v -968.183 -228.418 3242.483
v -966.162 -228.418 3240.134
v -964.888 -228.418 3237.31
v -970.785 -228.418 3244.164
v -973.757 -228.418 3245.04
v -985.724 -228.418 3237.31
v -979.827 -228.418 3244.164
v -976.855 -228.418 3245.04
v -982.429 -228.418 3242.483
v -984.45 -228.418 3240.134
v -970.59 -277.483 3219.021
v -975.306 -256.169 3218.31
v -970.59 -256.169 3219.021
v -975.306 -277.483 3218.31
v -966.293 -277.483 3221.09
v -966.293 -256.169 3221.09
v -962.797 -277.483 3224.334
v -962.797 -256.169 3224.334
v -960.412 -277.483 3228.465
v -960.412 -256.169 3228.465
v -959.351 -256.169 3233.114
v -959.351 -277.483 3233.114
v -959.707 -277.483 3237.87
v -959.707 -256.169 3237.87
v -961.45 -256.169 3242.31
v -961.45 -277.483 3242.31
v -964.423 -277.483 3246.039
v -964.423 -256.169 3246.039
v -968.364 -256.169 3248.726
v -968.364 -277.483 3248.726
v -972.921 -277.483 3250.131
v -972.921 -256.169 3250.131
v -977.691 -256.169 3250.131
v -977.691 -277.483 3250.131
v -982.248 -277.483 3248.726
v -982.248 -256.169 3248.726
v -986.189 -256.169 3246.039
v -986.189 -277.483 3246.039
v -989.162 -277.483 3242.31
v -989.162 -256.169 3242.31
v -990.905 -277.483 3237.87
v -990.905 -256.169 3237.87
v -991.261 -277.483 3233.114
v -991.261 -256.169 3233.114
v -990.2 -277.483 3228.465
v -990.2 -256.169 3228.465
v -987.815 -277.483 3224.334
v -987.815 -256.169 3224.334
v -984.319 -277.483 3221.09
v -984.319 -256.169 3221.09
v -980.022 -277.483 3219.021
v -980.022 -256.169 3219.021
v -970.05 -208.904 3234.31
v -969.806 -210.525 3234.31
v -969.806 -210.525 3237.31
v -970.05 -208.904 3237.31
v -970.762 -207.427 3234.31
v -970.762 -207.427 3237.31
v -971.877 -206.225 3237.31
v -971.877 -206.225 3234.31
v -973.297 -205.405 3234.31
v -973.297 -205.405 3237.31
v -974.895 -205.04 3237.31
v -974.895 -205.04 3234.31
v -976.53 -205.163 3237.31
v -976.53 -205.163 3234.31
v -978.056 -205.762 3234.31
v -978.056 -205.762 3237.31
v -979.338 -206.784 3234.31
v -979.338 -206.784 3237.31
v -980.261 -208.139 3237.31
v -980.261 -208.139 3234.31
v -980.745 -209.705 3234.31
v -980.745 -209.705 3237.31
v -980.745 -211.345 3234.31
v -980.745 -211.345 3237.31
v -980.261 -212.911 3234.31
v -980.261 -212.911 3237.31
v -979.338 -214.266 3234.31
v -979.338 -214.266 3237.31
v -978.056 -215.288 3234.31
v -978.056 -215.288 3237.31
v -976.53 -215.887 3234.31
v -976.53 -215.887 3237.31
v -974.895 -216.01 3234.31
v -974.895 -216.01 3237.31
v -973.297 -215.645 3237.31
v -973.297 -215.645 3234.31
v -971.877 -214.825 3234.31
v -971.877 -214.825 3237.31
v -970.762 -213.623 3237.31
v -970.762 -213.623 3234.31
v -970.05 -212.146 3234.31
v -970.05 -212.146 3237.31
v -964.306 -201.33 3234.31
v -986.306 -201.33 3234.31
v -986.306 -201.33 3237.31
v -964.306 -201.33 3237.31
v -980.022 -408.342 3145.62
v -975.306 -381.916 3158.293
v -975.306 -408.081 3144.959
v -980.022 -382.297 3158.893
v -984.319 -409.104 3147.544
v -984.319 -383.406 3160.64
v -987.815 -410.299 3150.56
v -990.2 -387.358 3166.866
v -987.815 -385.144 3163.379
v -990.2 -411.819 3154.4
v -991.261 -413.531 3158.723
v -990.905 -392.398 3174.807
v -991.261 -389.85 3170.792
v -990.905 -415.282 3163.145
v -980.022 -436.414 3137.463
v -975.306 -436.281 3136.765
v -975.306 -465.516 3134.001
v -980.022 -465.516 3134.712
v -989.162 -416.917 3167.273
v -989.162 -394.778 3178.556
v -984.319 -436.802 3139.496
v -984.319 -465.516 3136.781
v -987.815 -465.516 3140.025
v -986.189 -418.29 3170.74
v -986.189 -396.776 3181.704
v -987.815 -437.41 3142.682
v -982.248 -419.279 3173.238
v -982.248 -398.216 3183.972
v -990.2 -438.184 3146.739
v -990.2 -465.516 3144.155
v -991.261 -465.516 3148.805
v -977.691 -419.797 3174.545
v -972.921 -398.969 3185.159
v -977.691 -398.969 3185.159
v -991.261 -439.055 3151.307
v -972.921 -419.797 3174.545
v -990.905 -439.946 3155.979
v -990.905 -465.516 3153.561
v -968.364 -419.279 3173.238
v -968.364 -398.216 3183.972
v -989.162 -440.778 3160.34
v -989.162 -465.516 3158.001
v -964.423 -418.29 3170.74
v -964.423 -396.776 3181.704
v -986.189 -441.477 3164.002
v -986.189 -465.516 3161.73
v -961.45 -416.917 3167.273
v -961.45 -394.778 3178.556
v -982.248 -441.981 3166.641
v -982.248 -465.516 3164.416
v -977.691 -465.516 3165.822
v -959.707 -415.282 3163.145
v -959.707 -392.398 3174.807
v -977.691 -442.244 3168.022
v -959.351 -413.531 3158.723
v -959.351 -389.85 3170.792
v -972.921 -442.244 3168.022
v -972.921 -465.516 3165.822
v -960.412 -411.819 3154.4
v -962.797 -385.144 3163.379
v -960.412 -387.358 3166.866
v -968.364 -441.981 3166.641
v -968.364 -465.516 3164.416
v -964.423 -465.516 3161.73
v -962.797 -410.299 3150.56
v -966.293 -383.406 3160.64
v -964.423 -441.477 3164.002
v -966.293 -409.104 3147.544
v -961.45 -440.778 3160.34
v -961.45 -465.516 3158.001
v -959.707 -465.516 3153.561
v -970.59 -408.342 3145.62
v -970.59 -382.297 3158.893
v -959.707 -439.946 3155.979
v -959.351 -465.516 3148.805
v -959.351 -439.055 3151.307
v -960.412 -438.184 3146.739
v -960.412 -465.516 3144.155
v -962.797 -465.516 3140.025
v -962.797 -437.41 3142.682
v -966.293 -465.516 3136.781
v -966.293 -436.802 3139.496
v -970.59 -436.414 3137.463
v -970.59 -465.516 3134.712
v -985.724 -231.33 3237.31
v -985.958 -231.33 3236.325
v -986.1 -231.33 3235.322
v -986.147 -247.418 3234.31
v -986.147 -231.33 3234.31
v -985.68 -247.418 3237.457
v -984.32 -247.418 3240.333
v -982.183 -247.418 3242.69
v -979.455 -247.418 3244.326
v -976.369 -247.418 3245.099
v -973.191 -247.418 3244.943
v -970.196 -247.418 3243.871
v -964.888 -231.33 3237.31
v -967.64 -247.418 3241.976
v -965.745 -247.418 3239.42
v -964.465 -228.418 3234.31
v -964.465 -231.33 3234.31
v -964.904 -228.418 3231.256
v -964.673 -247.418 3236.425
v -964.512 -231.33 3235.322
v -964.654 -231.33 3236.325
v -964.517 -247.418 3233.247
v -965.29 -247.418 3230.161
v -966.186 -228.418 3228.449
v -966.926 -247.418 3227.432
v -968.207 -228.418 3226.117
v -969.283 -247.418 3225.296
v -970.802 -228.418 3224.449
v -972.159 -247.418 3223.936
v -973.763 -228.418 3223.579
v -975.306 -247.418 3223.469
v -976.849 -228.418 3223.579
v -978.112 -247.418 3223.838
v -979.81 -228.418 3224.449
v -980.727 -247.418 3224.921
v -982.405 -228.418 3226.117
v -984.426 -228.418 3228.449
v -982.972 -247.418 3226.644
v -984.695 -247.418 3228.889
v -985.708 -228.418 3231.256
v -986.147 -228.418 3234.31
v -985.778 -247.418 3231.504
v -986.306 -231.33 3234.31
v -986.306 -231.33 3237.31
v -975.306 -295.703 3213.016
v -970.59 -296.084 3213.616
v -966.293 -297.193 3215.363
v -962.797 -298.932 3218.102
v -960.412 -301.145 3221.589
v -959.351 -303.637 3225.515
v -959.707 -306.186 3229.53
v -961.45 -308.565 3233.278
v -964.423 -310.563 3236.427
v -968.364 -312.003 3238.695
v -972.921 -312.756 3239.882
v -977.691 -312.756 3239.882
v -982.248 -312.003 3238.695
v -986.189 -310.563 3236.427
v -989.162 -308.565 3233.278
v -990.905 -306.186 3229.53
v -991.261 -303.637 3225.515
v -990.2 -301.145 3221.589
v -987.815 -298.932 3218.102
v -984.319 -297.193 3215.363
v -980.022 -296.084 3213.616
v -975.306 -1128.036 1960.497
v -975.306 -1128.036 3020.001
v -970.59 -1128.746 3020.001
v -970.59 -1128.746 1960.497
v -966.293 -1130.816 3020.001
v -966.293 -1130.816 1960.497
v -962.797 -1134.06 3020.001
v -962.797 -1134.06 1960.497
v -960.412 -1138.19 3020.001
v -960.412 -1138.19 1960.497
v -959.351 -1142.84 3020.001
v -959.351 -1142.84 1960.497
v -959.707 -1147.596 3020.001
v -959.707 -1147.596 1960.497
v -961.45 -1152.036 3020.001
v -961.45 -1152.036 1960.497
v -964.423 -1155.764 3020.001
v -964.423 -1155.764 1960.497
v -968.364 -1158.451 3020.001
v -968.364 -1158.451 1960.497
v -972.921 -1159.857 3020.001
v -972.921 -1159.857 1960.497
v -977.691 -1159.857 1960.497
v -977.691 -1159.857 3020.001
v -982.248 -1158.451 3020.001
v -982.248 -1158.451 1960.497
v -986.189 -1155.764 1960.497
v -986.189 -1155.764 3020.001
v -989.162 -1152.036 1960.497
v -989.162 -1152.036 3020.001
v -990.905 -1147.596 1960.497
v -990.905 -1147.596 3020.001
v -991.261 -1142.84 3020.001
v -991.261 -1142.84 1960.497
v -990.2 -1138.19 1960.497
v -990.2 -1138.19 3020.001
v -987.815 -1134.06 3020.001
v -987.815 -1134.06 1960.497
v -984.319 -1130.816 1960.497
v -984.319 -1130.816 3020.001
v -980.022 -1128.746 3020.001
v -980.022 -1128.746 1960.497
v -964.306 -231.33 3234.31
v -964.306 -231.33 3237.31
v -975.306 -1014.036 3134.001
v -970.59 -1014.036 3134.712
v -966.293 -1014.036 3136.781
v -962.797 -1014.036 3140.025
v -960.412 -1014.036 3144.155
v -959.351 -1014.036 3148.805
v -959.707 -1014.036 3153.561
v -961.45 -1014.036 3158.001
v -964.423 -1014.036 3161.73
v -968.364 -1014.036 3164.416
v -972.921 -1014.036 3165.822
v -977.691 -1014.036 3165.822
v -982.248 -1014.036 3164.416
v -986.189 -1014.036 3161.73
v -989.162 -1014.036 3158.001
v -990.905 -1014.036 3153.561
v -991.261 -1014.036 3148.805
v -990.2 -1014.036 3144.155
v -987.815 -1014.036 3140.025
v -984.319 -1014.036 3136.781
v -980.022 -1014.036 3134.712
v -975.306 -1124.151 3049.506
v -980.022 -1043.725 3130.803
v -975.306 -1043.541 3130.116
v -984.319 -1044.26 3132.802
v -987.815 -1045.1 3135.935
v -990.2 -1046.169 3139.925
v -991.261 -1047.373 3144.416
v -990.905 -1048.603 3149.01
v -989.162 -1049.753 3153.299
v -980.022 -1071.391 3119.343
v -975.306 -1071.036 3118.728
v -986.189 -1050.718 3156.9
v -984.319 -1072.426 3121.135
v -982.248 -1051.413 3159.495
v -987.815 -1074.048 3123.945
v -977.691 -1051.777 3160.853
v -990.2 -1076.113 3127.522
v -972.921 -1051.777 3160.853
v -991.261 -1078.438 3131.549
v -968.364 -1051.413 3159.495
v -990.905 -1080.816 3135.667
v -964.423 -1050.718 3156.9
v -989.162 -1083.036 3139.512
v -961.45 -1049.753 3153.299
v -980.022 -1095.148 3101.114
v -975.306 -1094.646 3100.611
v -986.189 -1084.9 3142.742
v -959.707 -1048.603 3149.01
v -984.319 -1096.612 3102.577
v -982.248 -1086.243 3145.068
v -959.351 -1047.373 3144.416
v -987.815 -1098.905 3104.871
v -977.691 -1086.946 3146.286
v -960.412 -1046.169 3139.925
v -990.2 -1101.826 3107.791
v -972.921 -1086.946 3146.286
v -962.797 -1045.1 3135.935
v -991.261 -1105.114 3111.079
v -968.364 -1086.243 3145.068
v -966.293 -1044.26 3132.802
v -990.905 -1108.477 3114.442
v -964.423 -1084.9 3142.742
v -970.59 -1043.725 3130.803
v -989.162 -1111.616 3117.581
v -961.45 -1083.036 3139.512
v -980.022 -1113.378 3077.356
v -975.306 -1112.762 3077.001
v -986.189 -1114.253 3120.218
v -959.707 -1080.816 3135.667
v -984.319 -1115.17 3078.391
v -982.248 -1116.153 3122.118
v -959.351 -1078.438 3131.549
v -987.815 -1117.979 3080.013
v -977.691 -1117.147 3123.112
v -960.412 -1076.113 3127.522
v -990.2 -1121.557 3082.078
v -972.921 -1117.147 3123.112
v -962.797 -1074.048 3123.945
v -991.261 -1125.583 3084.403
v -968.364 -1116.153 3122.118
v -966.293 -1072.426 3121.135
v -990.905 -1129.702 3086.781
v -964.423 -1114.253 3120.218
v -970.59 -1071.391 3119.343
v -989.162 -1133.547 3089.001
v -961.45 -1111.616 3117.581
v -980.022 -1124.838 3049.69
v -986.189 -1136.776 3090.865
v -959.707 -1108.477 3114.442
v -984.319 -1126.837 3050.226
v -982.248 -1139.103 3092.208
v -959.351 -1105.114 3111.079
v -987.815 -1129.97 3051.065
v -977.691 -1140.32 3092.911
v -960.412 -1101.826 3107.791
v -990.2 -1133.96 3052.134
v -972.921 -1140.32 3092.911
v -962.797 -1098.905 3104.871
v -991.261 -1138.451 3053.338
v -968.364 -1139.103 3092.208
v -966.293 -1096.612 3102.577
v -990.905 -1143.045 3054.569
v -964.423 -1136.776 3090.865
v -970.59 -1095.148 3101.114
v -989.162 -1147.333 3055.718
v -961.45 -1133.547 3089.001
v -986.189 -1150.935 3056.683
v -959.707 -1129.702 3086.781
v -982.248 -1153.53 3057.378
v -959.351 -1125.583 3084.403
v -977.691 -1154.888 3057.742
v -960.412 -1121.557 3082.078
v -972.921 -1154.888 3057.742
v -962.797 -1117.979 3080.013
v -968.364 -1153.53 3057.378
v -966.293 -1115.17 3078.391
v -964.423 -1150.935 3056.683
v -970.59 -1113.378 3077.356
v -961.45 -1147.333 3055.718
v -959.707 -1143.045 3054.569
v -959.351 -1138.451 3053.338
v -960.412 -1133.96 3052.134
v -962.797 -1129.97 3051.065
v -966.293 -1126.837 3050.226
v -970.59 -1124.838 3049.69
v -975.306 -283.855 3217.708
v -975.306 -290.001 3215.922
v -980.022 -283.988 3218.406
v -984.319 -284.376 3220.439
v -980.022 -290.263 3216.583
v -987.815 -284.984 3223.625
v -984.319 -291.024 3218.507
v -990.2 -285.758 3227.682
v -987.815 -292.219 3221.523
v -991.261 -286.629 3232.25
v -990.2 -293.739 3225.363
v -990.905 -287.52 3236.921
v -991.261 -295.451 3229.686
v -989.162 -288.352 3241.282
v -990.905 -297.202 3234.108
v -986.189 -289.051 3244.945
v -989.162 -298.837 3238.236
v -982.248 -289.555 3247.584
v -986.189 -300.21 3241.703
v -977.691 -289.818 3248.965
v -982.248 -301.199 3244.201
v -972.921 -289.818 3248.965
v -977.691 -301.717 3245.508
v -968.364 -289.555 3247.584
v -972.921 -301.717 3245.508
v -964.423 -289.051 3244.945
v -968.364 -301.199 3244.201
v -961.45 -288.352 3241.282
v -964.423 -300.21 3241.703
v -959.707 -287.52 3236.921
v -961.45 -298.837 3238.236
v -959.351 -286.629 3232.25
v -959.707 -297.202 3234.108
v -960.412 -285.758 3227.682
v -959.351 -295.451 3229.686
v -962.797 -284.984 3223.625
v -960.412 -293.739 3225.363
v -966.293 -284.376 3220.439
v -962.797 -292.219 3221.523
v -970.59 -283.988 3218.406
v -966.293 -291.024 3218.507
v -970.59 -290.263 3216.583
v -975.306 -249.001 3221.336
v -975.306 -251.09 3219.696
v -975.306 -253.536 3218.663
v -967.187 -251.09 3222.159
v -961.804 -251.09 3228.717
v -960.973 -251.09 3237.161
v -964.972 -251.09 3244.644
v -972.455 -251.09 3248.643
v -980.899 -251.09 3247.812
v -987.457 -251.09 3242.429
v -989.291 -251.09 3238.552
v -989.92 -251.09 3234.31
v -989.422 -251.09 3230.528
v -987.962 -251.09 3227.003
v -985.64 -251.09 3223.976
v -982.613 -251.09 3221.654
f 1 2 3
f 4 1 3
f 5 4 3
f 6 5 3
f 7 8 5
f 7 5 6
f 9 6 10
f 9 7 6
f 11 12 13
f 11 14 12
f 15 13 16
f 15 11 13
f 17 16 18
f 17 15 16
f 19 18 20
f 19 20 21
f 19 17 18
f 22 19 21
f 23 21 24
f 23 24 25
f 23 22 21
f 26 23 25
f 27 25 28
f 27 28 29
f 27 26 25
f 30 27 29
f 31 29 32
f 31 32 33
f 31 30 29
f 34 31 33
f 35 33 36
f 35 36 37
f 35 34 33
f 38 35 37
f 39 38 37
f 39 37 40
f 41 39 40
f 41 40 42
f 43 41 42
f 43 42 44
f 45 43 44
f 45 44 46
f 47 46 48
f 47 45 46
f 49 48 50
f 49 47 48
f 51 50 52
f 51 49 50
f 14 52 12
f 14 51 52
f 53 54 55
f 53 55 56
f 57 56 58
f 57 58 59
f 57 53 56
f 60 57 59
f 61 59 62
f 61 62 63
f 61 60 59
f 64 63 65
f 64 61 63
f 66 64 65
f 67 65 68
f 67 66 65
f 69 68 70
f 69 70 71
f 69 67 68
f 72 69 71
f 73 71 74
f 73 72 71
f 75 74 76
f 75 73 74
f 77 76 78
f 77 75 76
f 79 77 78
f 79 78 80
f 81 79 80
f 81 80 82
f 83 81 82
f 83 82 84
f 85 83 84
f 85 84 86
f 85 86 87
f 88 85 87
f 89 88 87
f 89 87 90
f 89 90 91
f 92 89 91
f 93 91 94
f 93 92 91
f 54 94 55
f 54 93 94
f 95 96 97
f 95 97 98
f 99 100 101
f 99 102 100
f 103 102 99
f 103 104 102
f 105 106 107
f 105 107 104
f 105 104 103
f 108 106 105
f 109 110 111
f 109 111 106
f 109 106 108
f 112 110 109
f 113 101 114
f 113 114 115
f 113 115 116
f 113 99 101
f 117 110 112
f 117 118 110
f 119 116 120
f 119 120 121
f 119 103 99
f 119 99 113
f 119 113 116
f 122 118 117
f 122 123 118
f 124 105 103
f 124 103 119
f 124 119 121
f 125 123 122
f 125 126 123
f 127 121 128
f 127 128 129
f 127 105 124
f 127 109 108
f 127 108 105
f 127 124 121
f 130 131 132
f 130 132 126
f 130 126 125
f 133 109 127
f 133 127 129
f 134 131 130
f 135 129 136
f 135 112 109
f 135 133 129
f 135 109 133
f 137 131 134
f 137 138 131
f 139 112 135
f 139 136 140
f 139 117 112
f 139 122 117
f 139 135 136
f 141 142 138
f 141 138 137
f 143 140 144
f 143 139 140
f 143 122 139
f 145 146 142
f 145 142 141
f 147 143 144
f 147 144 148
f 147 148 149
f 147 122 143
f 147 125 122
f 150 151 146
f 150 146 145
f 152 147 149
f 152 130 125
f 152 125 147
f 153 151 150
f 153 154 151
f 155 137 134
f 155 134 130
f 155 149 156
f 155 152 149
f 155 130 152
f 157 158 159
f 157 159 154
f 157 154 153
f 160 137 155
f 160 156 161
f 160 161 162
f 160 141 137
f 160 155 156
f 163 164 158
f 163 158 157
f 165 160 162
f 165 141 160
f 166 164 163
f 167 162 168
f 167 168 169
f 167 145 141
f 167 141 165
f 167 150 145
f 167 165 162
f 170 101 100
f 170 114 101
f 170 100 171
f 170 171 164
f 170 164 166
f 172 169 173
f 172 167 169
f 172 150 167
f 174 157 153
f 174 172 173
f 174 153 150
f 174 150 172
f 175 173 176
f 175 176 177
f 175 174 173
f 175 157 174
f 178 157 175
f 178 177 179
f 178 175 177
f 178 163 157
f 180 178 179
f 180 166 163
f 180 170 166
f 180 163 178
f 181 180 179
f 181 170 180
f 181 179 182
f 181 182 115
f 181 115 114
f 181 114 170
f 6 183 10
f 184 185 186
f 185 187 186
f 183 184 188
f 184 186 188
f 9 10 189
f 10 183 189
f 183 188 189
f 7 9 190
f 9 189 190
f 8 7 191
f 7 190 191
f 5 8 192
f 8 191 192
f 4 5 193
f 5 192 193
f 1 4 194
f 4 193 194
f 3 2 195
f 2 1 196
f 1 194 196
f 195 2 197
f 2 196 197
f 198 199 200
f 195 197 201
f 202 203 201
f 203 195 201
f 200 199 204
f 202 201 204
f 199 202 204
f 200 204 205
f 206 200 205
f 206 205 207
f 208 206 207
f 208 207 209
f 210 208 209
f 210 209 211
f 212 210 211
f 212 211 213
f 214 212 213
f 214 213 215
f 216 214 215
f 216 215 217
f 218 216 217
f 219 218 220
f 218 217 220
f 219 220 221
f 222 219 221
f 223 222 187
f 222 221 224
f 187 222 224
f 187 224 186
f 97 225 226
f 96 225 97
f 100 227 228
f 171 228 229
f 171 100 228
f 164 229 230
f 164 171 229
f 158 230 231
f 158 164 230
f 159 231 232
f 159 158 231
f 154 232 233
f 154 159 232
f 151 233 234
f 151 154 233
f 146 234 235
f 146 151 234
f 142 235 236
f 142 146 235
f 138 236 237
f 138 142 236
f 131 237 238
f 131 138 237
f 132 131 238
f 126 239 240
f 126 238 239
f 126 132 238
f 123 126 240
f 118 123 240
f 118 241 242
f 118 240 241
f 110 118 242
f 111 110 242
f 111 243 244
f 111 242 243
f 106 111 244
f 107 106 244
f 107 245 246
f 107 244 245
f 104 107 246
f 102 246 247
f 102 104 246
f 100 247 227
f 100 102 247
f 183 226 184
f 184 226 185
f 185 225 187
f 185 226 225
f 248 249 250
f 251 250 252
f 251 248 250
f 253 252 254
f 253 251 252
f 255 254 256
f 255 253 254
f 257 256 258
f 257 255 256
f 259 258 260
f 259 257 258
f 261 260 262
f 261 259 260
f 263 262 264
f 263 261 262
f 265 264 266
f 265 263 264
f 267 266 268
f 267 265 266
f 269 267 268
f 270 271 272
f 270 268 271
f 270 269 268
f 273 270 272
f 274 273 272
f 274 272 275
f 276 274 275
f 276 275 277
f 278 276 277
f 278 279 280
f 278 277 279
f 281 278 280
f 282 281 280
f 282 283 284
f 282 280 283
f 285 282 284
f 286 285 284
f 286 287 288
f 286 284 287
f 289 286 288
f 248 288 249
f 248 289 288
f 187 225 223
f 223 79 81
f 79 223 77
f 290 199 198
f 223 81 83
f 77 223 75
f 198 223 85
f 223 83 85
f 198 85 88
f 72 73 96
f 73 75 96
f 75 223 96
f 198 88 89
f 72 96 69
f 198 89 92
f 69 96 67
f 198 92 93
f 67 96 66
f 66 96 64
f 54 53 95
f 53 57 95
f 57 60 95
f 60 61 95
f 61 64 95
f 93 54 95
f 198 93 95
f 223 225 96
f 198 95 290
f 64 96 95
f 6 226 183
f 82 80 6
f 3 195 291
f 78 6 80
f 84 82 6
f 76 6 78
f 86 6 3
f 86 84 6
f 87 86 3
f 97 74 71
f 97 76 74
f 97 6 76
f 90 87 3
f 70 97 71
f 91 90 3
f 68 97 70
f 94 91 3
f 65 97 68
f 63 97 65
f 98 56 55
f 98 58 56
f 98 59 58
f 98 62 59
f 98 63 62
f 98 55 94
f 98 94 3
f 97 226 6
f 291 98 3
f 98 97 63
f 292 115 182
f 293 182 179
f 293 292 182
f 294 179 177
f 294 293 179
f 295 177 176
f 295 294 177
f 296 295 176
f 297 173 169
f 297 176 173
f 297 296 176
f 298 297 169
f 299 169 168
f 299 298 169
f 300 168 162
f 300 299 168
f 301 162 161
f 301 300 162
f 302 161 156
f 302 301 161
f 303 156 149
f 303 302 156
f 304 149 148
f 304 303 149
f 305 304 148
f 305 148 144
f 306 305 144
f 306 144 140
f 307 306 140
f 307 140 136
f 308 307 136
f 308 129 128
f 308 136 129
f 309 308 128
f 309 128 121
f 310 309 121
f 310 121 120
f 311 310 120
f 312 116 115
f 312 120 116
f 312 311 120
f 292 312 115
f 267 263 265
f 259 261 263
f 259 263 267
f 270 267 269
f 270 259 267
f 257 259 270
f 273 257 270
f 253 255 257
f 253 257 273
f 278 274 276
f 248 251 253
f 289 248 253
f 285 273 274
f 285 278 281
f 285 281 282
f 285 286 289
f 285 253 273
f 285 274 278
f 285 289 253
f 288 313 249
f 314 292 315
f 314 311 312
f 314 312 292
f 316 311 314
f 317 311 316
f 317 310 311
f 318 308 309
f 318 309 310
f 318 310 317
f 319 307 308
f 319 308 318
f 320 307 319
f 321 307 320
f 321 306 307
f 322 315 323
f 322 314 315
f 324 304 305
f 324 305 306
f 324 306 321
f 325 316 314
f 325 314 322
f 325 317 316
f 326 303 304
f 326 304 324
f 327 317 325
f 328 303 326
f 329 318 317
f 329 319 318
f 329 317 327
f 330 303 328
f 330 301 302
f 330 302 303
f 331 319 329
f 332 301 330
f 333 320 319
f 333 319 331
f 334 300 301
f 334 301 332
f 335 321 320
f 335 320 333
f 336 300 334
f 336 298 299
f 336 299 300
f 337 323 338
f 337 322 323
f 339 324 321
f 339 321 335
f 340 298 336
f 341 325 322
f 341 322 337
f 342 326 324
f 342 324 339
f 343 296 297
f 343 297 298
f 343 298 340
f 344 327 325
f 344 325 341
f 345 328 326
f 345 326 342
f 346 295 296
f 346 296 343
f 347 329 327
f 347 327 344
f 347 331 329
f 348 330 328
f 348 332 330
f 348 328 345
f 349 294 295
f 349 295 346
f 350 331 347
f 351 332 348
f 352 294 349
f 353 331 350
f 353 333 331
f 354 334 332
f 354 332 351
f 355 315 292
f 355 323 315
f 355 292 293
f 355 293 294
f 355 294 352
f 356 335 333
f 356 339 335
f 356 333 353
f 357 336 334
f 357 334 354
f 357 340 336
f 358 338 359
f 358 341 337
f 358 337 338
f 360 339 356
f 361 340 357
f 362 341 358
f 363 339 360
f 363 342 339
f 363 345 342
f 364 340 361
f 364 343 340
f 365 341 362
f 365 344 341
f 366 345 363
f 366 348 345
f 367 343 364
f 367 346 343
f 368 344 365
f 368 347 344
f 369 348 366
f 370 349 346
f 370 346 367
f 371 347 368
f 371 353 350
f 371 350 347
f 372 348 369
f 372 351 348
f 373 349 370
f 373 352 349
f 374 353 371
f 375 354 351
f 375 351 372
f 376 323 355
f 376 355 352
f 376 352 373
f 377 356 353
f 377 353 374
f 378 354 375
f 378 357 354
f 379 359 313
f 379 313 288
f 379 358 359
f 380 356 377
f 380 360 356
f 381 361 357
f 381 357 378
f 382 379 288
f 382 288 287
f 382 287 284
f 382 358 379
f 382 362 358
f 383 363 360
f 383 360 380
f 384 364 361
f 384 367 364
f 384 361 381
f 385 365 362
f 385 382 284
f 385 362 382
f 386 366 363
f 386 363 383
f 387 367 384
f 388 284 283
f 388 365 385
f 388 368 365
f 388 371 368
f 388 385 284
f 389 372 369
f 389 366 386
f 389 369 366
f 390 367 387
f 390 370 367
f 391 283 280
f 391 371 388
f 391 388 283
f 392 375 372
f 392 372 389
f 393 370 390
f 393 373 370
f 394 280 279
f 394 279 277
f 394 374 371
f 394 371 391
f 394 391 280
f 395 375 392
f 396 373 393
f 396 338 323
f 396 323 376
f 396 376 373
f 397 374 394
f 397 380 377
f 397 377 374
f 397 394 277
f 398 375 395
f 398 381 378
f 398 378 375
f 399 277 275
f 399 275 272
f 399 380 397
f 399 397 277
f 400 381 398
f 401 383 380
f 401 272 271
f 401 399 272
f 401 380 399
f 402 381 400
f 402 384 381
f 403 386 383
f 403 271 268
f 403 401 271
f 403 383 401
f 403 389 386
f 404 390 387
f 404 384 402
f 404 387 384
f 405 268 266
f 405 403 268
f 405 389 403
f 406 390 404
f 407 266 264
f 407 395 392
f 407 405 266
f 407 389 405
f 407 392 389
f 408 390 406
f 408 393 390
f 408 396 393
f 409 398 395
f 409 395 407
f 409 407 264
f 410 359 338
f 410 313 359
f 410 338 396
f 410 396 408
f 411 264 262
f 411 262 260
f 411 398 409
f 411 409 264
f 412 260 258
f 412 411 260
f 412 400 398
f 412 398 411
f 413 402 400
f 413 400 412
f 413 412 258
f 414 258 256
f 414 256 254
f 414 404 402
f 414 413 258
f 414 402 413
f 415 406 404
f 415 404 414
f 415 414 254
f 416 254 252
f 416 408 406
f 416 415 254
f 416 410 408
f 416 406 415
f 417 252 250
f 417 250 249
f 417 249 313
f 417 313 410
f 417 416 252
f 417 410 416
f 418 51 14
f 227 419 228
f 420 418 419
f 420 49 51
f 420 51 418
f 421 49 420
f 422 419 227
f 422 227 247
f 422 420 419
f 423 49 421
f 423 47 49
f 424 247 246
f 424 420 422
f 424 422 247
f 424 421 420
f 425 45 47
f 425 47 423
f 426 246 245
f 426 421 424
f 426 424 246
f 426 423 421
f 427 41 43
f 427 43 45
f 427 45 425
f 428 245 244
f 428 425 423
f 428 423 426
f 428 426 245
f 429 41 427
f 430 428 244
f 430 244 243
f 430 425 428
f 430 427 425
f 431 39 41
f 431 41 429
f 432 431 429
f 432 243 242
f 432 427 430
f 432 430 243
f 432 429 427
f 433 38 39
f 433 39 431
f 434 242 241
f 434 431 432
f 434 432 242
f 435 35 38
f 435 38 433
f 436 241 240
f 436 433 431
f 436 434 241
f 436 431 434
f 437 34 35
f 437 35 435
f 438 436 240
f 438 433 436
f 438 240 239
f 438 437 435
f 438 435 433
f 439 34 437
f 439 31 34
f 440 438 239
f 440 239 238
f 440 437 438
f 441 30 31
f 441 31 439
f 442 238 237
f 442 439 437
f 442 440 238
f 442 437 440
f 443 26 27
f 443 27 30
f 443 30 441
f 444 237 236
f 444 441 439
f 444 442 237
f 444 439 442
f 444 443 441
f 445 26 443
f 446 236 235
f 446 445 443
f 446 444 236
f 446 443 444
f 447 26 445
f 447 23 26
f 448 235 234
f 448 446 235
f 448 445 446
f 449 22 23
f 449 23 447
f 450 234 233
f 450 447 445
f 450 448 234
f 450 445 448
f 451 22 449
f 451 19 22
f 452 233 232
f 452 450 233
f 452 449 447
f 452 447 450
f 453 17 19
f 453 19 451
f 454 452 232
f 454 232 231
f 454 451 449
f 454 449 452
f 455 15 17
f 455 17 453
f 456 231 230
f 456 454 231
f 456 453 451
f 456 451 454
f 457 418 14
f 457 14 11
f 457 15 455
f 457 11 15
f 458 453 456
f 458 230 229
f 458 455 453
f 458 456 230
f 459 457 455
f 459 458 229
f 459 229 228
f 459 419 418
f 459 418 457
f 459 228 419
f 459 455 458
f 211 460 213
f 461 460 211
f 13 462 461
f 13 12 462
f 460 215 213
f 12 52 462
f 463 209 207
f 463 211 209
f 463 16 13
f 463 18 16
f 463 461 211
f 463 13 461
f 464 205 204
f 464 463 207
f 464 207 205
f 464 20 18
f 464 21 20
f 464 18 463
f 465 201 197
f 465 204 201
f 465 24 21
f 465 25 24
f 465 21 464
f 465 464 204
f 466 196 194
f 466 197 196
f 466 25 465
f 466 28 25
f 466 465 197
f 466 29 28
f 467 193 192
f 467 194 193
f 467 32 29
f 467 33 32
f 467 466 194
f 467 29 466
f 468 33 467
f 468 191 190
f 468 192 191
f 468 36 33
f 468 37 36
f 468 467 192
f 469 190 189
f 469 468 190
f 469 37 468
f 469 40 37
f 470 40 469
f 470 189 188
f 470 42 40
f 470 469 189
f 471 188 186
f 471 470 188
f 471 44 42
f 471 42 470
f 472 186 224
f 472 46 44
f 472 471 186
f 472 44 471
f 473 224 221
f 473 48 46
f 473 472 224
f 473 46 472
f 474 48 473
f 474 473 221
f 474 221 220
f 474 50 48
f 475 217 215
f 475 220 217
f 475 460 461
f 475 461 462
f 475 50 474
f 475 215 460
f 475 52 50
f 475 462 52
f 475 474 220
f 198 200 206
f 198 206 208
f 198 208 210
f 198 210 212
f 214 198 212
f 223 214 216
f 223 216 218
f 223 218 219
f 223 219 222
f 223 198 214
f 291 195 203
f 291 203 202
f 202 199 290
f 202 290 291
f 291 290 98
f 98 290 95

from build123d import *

# Parameters (mm, degrees)
BARRER1_PROFILE_R       = 16
CROQUIS14_W             = 22
CROQUIS14_H             = 30
CROQUIS14_R             = 5.5
SALIENTE_EXTRUIR1_DEPTH = 3
CROQUIS15_R             = 10.841108792
SALIENTE_EXTRUIR2_DEPTH = 19
REDONDEO1_R             = 10


with BuildPart() as part:
    # Barrer1: sweep along a curve in space
    with BuildLine() as barrer1_path:
        Line((-975.305963879, -247.418485436, 3234.31), (-975.305963879, -277.482733156, 3234.31))
        ThreePointArc((-975.305963879, -277.482733156, 3234.31), (-975.305963879, -291.434368594, 3232.3240799), (-975.305963879, -304.277730703, 3226.524074744))
        Line((-975.305963879, -304.277730703, 3226.524074744), (-975.305963879, -390.490454439, 3171.801337481))
        ThreePointArc((-975.305963879, -390.490454439, 3171.801337481), (-975.305963879, -426.451868342, 3155.561323045), (-975.305963879, -465.51644757, 3150.000746764))
        Line((-975.305963879, -465.51644757, 3150.000746764), (-975.305963879, -1014.035511618, 3150.000746764))
        ThreePointArc((-975.305963879, -1144.035511618, 3020.000746764), (-975.305963879, -1105.959393172, 3111.924628318), (-975.305963879, -1014.035511618, 3150.000746764))
        Line((-975.305963879, -1144.035511618, 3020.000746764), (-975.305963879, -1144.035511618, 1960.497178493))
    # Barrer1 profile (on start of the path) → Barrer1 (sweep)
    with BuildSketch(Plane(origin=(-975.305963879, -247.418485436, 3234.31), x_dir=(0, 0, -1), z_dir=(0, -1, 0))):
        Circle(BARRER1_PROFILE_R)
    sweep(path=barrer1_path.line)



with BuildPart() as body_2:
    # Croquis14 → Saliente-Extruir1 (new body)
    with BuildSketch(Plane.XY.offset(3234.31)):
        with Locations((-975.305963879, -216.330473188)):
            Rectangle(CROQUIS14_W, CROQUIS14_H)
        with Locations((-975.305963879, -210.525068536)):
            Circle(CROQUIS14_R, mode=Mode.SUBTRACT)
    extrude(amount=SALIENTE_EXTRUIR1_DEPTH)


with BuildPart() as part_1:
    add(part.part)

    add(body_2.part)  # Saliente-Extruir2 merges body 2
    # Croquis15 → Saliente-Extruir2 (add)
    with BuildSketch(Plane(origin=(0, -247.418485436, 0), x_dir=(1, 0, 0), z_dir=(0, 1, 0))):
        with Locations(Location((-975.305963879, -3234.31, 0), (0, 0, 180))):
            Circle(CROQUIS15_R)
    extrude(amount=SALIENTE_EXTRUIR2_DEPTH)

    # Redondeo1
    # the kernel refuses this fillet: 10 mm, written as the material it takes off along each edge
    with BuildSketch(Plane(origin=(-975.305963879, -247.418485436, 3234.31), x_dir=(0, 0, -1), z_dir=(-1, 0, 0))) as redondeo1_piece_1:
        with BuildLine():
            CenterArc((6, 8.75006661), REDONDEO1_R, 298.954236043, 61.045763957)
            Line((10.841108792, 0), (10.937930967, -0.175001332))
            ThreePointArc((10.937930967, -0.175001332), (13.420554396, -0.2), (16, -0.2))
            Line((16, -0.2), (16.2, 0))
            Line((16.2, 0), (16.2, 8.75006661))
            Line((16.2, 8.75006661), (16, 8.75006661))
        make_face()
    revolve(axis=Axis((-975.305963879, -247.418485436, 3234.31), (0, -1, 0)), mode=Mode.SUBTRACT)


solid = part_1.part
